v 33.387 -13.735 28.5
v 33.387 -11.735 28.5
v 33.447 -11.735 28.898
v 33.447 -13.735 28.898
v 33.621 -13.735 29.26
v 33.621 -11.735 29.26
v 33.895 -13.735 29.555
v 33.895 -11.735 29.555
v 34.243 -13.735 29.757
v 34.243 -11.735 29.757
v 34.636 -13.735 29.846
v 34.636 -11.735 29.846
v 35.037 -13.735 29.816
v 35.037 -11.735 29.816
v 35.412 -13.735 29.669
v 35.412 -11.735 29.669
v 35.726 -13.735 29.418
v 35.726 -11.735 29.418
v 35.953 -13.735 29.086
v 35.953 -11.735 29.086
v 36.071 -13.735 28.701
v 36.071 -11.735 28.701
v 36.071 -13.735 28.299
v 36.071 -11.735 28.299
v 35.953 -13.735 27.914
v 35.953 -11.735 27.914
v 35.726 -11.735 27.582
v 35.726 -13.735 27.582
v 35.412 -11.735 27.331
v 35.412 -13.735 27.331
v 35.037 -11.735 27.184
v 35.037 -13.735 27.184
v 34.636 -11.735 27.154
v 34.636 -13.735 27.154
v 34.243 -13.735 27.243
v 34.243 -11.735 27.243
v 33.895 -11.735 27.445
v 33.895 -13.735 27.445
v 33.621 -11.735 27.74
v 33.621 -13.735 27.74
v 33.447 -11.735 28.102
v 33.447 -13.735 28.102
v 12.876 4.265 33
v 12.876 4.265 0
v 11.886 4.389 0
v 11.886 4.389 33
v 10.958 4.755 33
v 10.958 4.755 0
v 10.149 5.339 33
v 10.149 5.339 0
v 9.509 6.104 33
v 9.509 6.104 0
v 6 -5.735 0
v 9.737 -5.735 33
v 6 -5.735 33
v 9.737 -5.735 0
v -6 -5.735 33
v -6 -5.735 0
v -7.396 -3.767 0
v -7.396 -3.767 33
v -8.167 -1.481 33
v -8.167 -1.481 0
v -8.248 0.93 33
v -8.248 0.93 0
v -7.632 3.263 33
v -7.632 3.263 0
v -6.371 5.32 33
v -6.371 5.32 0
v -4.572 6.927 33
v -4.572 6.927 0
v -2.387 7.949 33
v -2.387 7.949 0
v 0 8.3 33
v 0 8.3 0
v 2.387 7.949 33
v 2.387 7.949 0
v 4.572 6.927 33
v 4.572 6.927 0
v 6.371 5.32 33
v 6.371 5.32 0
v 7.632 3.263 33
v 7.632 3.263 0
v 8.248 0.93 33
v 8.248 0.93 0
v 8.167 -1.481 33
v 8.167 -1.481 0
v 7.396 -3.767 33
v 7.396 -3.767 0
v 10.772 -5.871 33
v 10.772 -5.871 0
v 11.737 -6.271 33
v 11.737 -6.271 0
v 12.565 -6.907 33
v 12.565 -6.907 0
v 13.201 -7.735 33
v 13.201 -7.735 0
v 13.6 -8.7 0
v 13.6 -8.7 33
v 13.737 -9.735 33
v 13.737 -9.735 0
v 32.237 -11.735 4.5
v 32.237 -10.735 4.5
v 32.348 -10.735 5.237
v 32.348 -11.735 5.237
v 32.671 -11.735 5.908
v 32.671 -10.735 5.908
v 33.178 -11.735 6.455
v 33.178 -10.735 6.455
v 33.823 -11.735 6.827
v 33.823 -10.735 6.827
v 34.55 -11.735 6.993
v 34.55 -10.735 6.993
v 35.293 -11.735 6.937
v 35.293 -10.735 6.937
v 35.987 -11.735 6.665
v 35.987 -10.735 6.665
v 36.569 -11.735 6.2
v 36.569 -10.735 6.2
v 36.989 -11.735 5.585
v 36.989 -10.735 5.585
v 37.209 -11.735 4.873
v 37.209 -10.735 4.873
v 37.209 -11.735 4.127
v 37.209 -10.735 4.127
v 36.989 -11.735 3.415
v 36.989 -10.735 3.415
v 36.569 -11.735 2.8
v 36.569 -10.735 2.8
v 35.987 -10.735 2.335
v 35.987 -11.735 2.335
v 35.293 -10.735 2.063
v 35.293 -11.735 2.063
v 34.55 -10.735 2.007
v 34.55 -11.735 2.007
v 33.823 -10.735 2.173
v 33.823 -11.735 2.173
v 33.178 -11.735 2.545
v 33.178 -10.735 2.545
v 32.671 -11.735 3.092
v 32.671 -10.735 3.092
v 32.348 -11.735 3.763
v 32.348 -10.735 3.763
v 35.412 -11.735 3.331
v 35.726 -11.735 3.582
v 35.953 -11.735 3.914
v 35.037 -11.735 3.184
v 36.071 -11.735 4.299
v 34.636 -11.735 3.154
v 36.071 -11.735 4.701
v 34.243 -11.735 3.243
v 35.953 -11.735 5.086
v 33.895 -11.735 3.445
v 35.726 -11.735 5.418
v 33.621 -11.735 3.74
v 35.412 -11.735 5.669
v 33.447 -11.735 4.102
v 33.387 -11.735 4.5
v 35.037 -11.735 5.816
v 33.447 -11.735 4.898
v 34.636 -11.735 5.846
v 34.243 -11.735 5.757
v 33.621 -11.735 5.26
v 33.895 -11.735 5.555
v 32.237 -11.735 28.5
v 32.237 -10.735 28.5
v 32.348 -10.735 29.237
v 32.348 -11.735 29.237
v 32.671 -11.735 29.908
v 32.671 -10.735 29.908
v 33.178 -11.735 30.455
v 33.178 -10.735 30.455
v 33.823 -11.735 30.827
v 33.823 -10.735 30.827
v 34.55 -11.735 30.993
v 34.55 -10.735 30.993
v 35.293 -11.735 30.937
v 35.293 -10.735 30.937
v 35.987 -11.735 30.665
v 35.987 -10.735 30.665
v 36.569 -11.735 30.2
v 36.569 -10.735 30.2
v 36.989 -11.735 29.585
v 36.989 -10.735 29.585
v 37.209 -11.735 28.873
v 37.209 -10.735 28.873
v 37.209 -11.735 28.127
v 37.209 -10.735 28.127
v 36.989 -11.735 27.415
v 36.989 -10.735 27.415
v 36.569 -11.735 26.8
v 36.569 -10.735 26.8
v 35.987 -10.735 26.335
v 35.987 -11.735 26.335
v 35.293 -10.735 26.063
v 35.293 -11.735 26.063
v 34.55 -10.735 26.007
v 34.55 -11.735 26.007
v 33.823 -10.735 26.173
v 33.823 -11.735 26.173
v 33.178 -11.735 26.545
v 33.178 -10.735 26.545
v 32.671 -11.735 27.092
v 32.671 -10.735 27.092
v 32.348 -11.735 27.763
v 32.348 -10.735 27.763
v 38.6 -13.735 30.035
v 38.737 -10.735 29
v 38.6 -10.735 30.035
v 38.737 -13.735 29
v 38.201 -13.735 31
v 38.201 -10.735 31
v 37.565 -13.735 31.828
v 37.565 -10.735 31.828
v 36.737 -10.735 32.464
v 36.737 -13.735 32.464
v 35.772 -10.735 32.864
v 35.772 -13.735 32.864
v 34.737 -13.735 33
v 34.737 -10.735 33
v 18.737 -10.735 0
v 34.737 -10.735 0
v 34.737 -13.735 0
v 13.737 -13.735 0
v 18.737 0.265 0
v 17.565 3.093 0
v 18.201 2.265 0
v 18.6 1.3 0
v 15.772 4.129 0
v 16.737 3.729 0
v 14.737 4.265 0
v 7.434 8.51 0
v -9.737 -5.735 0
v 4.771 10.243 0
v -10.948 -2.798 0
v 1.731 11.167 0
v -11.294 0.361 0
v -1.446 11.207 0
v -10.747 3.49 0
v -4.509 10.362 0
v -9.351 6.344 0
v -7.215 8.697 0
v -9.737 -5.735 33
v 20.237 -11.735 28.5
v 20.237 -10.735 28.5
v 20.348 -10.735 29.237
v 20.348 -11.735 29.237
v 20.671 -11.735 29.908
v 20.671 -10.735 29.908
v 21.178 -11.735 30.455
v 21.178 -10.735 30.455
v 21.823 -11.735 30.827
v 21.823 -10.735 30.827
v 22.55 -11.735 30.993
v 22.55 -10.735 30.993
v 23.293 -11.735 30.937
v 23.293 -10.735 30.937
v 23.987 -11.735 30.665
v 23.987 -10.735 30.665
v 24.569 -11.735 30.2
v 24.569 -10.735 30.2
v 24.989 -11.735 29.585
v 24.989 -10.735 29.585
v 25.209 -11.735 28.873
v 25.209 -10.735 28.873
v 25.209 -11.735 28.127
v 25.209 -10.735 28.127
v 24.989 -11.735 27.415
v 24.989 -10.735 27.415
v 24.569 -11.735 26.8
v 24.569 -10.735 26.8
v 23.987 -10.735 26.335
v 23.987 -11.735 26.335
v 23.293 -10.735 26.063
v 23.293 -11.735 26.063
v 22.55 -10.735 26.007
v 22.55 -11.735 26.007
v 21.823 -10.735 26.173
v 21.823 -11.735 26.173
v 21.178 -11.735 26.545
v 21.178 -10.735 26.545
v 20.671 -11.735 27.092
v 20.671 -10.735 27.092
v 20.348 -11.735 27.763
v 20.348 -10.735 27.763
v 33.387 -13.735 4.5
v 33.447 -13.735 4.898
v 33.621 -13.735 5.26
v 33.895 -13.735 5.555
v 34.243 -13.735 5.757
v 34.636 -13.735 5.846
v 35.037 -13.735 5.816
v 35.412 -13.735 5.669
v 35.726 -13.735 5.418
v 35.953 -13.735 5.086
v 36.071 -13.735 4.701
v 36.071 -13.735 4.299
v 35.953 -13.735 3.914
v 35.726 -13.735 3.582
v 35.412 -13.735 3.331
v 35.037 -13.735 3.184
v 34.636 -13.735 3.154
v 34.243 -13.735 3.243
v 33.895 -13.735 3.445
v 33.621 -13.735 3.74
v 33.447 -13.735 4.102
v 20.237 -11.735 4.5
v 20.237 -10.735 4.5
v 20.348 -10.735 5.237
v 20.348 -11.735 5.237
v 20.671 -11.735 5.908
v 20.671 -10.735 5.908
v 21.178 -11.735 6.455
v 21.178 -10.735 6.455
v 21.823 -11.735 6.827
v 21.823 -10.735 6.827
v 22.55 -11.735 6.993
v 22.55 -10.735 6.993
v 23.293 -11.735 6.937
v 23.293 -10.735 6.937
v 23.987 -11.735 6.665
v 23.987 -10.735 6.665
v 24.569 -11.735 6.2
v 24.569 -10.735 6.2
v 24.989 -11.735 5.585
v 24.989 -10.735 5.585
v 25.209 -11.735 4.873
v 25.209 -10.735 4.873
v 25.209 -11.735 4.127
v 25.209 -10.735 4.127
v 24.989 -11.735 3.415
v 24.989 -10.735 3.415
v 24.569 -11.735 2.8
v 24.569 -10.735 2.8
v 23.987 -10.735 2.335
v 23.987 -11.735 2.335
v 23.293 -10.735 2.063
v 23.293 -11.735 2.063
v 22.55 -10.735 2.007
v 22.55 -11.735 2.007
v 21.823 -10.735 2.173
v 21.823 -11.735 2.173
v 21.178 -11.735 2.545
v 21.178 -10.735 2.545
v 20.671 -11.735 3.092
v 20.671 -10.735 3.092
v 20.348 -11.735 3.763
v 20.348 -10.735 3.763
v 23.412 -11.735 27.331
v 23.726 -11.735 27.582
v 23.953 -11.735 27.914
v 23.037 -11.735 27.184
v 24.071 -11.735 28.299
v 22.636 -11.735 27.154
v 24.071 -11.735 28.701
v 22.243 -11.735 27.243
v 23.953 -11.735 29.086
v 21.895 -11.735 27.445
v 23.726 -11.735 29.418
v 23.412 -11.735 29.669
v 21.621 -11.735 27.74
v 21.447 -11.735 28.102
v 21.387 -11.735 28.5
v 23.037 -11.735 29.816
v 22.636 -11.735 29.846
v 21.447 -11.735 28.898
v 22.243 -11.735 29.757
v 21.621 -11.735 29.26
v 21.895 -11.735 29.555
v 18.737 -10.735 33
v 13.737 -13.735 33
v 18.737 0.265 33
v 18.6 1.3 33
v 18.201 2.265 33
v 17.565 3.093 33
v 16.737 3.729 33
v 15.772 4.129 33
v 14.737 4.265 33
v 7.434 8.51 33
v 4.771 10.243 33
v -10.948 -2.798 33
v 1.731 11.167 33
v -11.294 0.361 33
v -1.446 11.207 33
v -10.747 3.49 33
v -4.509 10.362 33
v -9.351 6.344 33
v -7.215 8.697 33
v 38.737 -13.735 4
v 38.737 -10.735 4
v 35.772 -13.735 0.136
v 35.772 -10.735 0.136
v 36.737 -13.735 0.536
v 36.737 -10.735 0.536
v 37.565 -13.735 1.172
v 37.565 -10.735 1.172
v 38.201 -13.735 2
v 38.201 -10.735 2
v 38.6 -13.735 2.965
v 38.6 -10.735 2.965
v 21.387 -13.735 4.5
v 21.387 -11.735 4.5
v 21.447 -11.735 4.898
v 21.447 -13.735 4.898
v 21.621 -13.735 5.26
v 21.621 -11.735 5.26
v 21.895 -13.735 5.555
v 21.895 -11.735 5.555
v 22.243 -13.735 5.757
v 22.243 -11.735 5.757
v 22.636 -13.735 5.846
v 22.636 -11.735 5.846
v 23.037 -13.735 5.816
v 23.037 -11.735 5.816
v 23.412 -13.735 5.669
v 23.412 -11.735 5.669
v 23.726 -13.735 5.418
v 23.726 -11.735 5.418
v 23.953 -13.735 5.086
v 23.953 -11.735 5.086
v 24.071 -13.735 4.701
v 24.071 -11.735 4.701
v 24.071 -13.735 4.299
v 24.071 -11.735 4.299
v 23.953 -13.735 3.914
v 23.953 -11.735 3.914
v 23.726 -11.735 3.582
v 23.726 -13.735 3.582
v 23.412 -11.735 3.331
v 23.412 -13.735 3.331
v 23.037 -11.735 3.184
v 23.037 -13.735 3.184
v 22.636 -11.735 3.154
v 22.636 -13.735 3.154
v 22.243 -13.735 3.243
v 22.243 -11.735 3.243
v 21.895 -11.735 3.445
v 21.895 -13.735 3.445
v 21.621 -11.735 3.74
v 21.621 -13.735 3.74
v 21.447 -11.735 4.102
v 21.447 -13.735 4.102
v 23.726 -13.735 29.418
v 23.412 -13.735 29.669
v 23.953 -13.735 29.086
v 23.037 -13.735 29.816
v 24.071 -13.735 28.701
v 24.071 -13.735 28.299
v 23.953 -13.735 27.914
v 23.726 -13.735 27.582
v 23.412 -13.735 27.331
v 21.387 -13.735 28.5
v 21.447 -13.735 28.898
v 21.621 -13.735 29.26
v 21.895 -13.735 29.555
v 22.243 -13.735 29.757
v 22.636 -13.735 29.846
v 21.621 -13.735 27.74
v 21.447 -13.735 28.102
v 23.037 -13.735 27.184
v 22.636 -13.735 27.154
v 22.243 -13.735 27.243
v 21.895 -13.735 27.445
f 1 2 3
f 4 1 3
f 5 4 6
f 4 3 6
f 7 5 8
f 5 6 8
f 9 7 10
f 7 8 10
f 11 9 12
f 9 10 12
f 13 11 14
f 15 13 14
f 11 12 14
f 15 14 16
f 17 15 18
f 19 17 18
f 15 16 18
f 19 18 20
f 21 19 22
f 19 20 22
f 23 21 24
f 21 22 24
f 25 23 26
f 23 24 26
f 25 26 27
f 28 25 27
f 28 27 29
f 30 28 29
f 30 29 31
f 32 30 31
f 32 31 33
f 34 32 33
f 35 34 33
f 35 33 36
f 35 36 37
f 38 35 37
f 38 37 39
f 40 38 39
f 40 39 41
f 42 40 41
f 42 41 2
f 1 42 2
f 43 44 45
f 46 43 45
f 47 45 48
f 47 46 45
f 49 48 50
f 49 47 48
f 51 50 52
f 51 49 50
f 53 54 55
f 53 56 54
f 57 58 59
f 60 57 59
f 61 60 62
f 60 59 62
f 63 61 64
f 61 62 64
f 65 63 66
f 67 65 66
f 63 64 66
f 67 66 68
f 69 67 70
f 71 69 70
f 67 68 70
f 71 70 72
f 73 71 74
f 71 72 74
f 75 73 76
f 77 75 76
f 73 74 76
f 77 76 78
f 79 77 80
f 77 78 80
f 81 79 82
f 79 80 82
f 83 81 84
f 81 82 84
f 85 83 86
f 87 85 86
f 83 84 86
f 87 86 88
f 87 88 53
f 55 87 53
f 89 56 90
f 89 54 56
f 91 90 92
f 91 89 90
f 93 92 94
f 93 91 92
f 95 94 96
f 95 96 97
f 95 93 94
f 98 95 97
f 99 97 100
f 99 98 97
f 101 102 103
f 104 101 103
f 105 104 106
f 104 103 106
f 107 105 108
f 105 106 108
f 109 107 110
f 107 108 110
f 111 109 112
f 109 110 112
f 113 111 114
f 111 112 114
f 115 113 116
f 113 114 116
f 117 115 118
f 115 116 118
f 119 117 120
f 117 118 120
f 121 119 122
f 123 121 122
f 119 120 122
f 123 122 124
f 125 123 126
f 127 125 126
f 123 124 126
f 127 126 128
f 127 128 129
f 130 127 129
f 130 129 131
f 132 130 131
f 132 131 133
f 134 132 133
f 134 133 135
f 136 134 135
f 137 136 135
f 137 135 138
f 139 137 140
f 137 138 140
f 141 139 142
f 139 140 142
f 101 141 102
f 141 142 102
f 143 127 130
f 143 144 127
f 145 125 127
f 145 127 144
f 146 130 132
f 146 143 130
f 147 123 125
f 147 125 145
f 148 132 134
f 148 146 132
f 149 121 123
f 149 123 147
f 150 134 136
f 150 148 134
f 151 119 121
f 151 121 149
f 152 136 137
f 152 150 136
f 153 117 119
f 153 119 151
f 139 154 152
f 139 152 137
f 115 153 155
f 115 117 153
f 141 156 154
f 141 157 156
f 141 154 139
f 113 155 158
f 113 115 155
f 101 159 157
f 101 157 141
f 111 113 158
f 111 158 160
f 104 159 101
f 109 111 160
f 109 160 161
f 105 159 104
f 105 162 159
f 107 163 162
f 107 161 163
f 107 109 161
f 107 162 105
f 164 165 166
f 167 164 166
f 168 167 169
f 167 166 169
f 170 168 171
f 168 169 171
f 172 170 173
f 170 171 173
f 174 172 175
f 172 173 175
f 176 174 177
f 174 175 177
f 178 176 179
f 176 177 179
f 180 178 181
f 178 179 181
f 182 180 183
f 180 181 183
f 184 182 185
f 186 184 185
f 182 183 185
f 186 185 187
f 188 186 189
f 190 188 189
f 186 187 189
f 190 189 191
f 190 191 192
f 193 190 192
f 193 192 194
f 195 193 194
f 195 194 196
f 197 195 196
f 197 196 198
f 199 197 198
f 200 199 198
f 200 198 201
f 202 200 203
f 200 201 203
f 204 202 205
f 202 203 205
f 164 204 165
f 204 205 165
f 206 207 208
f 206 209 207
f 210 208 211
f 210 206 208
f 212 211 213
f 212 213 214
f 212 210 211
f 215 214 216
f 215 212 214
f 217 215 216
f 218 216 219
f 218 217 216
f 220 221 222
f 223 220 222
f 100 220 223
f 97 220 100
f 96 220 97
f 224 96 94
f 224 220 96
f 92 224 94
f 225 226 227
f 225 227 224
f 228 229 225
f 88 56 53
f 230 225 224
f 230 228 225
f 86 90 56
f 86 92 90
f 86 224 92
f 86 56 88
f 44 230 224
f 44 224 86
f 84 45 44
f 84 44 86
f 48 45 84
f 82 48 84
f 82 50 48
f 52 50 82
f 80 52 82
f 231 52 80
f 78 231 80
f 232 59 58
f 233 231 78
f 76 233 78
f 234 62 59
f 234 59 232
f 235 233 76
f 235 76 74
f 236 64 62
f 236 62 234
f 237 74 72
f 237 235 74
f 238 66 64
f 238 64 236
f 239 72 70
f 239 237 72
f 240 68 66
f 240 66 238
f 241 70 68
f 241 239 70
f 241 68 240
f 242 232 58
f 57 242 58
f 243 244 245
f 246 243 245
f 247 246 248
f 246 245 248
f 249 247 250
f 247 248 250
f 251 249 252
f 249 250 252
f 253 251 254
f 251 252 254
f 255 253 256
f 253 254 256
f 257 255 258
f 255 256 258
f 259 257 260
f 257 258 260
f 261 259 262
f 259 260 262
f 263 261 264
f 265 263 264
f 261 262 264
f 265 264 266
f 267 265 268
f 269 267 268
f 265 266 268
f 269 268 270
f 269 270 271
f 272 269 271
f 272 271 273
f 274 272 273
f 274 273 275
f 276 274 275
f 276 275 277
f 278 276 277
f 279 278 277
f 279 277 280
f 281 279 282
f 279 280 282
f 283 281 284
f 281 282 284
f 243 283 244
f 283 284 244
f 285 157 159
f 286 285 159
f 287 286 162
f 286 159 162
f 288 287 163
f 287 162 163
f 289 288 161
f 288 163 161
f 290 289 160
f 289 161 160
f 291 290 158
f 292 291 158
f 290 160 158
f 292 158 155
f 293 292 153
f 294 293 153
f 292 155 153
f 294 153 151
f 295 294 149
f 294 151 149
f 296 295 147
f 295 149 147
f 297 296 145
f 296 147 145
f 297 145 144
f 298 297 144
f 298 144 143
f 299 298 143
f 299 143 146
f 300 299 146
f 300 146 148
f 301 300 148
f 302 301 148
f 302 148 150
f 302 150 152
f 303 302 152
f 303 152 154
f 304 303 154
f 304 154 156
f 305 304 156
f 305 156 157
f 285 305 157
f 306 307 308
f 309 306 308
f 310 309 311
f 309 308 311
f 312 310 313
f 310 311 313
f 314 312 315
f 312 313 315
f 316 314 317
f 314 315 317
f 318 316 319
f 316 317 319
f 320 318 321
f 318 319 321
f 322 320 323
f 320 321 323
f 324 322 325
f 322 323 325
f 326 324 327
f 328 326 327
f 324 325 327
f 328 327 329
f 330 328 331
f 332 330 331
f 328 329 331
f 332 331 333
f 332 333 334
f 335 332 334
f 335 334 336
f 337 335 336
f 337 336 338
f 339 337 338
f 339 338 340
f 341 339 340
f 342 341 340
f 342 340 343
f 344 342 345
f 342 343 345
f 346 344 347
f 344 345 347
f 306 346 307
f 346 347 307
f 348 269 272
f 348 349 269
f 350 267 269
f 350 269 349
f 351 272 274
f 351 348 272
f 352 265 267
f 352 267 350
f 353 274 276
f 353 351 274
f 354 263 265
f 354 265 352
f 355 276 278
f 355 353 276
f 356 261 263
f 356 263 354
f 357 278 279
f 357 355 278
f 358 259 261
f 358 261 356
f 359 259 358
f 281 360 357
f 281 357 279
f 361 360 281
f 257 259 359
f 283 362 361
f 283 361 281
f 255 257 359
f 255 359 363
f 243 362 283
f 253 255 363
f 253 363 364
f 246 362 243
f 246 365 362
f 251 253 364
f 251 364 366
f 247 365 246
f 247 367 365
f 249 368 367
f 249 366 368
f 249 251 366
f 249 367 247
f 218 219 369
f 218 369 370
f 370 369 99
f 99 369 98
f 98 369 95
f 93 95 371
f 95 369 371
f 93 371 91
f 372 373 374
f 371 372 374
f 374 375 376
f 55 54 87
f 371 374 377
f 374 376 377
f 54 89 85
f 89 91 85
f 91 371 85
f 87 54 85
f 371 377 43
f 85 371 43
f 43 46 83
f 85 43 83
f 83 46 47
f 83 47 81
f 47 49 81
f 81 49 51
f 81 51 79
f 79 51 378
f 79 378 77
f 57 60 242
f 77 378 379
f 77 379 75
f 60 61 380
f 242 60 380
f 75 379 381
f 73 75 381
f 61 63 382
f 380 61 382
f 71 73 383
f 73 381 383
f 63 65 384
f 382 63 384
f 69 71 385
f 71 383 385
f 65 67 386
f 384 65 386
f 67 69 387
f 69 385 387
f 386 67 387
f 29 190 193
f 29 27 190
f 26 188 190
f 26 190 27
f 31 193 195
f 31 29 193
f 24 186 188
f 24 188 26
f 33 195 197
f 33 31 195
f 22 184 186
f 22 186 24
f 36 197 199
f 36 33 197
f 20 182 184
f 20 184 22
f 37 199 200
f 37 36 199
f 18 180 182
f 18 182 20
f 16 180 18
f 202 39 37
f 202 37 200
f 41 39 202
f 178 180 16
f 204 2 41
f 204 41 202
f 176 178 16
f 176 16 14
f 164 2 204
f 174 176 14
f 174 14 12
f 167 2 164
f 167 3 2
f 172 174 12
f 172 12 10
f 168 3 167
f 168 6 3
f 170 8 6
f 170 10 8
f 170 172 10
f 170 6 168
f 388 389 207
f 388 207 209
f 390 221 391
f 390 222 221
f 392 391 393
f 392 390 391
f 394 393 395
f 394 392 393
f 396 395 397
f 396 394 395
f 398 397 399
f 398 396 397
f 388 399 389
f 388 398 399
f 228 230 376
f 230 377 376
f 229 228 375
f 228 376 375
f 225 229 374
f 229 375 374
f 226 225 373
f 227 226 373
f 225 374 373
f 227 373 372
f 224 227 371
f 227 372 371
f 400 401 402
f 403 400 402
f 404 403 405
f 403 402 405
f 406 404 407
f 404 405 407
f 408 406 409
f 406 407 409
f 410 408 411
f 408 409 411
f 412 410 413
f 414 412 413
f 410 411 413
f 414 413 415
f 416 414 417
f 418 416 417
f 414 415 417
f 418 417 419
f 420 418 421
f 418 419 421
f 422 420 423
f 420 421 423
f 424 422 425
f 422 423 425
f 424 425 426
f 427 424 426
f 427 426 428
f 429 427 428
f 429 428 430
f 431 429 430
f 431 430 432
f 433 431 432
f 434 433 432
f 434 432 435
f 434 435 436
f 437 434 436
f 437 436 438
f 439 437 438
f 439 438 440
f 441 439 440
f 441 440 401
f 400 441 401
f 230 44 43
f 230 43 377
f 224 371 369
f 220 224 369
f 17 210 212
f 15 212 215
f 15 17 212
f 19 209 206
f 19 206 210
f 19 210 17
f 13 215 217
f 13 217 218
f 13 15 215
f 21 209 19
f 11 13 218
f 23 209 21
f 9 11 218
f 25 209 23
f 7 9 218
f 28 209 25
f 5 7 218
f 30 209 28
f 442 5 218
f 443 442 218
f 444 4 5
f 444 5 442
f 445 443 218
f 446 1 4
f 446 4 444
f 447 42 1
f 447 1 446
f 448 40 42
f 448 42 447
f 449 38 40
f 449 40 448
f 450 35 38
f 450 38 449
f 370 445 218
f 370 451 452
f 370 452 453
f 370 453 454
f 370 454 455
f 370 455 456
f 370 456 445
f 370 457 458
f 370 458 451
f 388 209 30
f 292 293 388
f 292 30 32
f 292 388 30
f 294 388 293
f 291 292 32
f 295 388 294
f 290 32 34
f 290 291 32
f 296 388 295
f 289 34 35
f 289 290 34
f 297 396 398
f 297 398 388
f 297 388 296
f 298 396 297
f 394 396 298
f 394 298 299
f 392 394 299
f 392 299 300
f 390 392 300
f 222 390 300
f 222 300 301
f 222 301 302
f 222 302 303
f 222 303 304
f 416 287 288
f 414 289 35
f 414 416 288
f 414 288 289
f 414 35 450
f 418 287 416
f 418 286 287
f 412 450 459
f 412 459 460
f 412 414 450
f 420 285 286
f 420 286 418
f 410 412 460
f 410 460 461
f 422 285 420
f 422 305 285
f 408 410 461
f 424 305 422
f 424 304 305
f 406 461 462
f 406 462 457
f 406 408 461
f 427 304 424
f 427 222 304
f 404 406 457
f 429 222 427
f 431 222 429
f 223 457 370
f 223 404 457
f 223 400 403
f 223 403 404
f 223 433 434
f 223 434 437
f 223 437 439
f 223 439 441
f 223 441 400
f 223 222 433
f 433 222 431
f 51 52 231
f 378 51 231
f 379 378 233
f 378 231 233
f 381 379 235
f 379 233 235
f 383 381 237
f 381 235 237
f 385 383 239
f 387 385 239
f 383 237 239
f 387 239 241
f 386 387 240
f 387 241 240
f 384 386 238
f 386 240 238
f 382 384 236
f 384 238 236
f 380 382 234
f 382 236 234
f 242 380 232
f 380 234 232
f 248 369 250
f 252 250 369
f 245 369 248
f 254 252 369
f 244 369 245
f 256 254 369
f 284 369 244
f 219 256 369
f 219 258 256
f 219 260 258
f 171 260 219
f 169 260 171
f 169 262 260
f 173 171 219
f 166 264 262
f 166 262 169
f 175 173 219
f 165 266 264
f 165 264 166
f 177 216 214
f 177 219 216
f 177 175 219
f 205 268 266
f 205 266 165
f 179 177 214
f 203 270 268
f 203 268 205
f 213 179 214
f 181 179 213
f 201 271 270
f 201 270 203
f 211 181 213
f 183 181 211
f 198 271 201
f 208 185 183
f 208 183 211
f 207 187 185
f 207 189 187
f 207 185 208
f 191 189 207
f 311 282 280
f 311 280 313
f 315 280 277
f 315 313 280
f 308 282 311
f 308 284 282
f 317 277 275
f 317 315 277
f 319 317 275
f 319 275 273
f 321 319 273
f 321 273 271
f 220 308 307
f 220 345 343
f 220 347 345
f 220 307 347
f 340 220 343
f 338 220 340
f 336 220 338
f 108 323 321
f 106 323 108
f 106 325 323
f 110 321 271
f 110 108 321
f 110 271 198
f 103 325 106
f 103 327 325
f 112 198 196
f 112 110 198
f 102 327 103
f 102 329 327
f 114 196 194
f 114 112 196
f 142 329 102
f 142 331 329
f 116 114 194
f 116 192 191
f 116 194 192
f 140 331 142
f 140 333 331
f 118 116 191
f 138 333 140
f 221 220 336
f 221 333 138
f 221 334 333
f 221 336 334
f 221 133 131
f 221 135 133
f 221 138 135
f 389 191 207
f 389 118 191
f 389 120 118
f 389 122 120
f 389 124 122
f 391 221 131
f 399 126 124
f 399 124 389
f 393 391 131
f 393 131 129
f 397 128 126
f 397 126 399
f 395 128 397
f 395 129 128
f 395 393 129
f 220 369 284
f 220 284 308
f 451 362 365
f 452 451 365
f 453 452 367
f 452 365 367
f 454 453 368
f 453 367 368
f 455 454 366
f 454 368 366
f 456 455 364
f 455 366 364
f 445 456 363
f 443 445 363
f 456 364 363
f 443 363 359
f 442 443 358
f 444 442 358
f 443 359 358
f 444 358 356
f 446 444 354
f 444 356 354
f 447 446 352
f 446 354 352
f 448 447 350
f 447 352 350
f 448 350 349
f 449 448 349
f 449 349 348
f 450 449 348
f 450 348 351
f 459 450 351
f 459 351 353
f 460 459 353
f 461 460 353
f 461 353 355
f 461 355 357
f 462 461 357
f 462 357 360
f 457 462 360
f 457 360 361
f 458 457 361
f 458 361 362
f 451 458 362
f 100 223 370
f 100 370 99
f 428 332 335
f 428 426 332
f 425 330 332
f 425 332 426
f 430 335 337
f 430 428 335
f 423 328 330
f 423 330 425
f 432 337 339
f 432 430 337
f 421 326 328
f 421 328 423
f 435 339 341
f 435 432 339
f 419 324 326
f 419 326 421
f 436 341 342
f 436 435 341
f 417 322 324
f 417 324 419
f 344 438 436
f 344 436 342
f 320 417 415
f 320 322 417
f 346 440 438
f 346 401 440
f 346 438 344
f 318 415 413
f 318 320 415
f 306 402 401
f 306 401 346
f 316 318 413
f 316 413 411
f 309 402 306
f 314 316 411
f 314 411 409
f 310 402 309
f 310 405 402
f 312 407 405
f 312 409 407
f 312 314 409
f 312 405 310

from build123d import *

# Parameters (mm, degrees)
BOSS_EXTRUDE1_DEPTH = 33
BOSS_EXTRUDE2_DEPTH = 33
FILLET1_R           = 4
FILLET3_R           = 4
SKETCH3_R           = 1.35
CUT_EXTRUDE1_DEPTH  = 10
SKETCH4_R           = 2.5
CUT_EXTRUDE2_DEPTH  = 1
FILLET4_R           = 4


with BuildPart() as part:
    # Sketch1 → Boss-Extrude1 (new body)
    with BuildSketch(Plane.XY):
        with BuildLine():
            Line((-9.736529156, -5.734980384), (-6, -5.734980384))
            ThreePointArc((-6, -5.734980384), (0, 8.3), (6, -5.734980384))
            Line((6, -5.734980384), (9.736529156, -5.734980384))
            ThreePointArc((9.736529156, -5.734980384), (0, 11.3), (-9.736529156, -5.734980384))
        make_face()
    extrude(amount=BOSS_EXTRUDE1_DEPTH)

    # Sketch2 → Boss-Extrude2 (add)
    with BuildSketch(Plane(origin=(0, 0, 0), x_dir=(-1, 0, 0), z_dir=(0, 0, -1))):
        with BuildLine():
            Line((-10.464206022, 4.265019616), (-18.736529156, 4.265019616))
            Line((-18.736529156, 4.265019616), (-18.736529156, -10.734980384))
            Line((-18.736529156, -10.734980384), (-38.736529156, -10.734980384))
            Line((-38.736529156, -10.734980384), (-38.736529156, -13.734980384))
            Line((-38.736529156, -13.734980384), (-13.736529156, -13.734980384))
            Line((-13.736529156, -13.734980384), (-13.736529156, -5.734980384))
            Line((-13.736529156, -5.734980384), (-9.736529156, -5.734980384))
            ThreePointArc((-9.736529156, -5.734980384), (-11.270200772, -0.820106438), (-10.464206022, 4.265019616))
        make_face()
    extrude(amount=-BOSS_EXTRUDE2_DEPTH)

    # Fillet1
    fillet1_edges = [part.edges().sort_by_distance(p)[0] for p in [
        (18.736529156, 4.265019616, 16.5),
        (10.464206022, 4.265019616, 16.5),
    ]]
    fillet(fillet1_edges, radius=FILLET1_R)

    # Fillet3
    fillet3_edges = [part.edges().sort_by_distance(p)[0] for p in [
        (13.736529156, -5.734980384, 16.5),
    ]]
    fillet(fillet3_edges, radius=FILLET3_R)

    # Sketch3 → Cut-Extrude1 (cut)
    with BuildSketch(Plane(origin=(0, -10.734980384, 0), x_dir=(1, 0, 0), z_dir=(0, 1, 0))):
        with Locations(Location((22.736529156, -4.5, 0), (0, 0, 180))):
            Circle(SKETCH3_R)
        with Locations(Location((34.736529156, -4.5, 0), (0, 0, 180))):
            Circle(SKETCH3_R)
        with Locations(Location((34.736529156, -28.5, 0), (0, 0, 180))):
            Circle(SKETCH3_R)
        with Locations(Location((22.736529156, -28.5, 0), (0, 0, 180))):
            Circle(SKETCH3_R)
    extrude(amount=-CUT_EXTRUDE1_DEPTH, mode=Mode.SUBTRACT)

    # Sketch4 → Cut-Extrude2 (cut)
    with BuildSketch(Plane(origin=(0, -10.734980384, 0), x_dir=(1, 0, 0), z_dir=(0, 1, 0))):
        with Locations(Location((22.736529156, -28.5, 0), (0, 0, 180))):
            Circle(SKETCH4_R)
        with Locations(Location((34.736529156, -28.5, 0), (0, 0, 180))):
            Circle(SKETCH4_R)
        with Locations(Location((34.736529156, -4.5, 0), (0, 0, 180))):
            Circle(SKETCH4_R)
        with Locations(Location((22.736529156, -4.5, 0), (0, 0, 180))):
            Circle(SKETCH4_R)
    extrude(amount=-CUT_EXTRUDE2_DEPTH, mode=Mode.SUBTRACT)

    # Fillet4
    fillet4_edges = [part.edges().sort_by_distance(p)[0] for p in [
        (38.736529156, -12.234980384, 0),
        (38.736529156, -12.234980384, 33),
    ]]
    fillet(fillet4_edges, radius=FILLET4_R)


solid = part.part
